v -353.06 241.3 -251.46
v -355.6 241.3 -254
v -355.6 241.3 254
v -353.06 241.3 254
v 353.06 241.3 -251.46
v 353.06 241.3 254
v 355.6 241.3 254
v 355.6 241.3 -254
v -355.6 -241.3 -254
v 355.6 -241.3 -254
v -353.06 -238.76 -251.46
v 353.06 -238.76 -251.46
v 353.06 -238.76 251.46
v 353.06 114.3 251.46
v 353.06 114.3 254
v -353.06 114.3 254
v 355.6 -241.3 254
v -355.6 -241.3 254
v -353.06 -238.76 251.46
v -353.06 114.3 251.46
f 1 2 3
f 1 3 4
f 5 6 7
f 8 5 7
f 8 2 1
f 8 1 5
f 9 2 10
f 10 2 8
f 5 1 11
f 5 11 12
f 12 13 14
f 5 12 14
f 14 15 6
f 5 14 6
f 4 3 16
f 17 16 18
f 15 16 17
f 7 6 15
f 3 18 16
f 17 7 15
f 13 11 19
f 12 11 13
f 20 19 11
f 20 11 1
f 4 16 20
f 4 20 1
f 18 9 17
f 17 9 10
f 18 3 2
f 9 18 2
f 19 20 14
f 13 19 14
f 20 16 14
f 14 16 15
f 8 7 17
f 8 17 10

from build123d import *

# Parameters (mm, degrees)
SKETCH1_W           = 711.2
SKETCH1_H           = 508
BOSS_EXTRUDE1_DEPTH = 241.3
SHELL1_T            = -2.54
CUT_EXTRUDE1_REACH  = 510
SKETCH2_W           = 706.12
SKETCH2_H           = 127


with BuildPart() as part:
    # Sketch1 → Boss-Extrude1 (new body, symmetric)
    with BuildSketch(Plane(origin=(0, 0, 0), x_dir=(1, 0, 0), z_dir=(0, 1, 0))):
        Rectangle(SKETCH1_W, SKETCH1_H)
    extrude(amount=BOSS_EXTRUDE1_DEPTH, both=True)

    # Shell1
    shell1_openings = [part.faces().sort_by_distance(p)[0] for p in [
        (0, 241.3, 0),
    ]]
    offset(amount=SHELL1_T, openings=shell1_openings, kind=Kind.INTERSECTION)

    # Sketch2 → Cut-Extrude1 (cut, up to next)
    with BuildSketch(Plane.XY.offset(254), mode=Mode.PRIVATE) as cut_extrude1_sk1:
        with Locations((0, 177.8)):
            Rectangle(SKETCH2_W, SKETCH2_H)
    cut_extrude1_tool1 = extrude(cut_extrude1_sk1.sketch, amount=-CUT_EXTRUDE1_REACH, mode=Mode.PRIVATE) & part.part
    add(cut_extrude1_tool1.solids().sort_by_distance((0, 177.8, 254))[0], mode=Mode.SUBTRACT)


solid = part.part
